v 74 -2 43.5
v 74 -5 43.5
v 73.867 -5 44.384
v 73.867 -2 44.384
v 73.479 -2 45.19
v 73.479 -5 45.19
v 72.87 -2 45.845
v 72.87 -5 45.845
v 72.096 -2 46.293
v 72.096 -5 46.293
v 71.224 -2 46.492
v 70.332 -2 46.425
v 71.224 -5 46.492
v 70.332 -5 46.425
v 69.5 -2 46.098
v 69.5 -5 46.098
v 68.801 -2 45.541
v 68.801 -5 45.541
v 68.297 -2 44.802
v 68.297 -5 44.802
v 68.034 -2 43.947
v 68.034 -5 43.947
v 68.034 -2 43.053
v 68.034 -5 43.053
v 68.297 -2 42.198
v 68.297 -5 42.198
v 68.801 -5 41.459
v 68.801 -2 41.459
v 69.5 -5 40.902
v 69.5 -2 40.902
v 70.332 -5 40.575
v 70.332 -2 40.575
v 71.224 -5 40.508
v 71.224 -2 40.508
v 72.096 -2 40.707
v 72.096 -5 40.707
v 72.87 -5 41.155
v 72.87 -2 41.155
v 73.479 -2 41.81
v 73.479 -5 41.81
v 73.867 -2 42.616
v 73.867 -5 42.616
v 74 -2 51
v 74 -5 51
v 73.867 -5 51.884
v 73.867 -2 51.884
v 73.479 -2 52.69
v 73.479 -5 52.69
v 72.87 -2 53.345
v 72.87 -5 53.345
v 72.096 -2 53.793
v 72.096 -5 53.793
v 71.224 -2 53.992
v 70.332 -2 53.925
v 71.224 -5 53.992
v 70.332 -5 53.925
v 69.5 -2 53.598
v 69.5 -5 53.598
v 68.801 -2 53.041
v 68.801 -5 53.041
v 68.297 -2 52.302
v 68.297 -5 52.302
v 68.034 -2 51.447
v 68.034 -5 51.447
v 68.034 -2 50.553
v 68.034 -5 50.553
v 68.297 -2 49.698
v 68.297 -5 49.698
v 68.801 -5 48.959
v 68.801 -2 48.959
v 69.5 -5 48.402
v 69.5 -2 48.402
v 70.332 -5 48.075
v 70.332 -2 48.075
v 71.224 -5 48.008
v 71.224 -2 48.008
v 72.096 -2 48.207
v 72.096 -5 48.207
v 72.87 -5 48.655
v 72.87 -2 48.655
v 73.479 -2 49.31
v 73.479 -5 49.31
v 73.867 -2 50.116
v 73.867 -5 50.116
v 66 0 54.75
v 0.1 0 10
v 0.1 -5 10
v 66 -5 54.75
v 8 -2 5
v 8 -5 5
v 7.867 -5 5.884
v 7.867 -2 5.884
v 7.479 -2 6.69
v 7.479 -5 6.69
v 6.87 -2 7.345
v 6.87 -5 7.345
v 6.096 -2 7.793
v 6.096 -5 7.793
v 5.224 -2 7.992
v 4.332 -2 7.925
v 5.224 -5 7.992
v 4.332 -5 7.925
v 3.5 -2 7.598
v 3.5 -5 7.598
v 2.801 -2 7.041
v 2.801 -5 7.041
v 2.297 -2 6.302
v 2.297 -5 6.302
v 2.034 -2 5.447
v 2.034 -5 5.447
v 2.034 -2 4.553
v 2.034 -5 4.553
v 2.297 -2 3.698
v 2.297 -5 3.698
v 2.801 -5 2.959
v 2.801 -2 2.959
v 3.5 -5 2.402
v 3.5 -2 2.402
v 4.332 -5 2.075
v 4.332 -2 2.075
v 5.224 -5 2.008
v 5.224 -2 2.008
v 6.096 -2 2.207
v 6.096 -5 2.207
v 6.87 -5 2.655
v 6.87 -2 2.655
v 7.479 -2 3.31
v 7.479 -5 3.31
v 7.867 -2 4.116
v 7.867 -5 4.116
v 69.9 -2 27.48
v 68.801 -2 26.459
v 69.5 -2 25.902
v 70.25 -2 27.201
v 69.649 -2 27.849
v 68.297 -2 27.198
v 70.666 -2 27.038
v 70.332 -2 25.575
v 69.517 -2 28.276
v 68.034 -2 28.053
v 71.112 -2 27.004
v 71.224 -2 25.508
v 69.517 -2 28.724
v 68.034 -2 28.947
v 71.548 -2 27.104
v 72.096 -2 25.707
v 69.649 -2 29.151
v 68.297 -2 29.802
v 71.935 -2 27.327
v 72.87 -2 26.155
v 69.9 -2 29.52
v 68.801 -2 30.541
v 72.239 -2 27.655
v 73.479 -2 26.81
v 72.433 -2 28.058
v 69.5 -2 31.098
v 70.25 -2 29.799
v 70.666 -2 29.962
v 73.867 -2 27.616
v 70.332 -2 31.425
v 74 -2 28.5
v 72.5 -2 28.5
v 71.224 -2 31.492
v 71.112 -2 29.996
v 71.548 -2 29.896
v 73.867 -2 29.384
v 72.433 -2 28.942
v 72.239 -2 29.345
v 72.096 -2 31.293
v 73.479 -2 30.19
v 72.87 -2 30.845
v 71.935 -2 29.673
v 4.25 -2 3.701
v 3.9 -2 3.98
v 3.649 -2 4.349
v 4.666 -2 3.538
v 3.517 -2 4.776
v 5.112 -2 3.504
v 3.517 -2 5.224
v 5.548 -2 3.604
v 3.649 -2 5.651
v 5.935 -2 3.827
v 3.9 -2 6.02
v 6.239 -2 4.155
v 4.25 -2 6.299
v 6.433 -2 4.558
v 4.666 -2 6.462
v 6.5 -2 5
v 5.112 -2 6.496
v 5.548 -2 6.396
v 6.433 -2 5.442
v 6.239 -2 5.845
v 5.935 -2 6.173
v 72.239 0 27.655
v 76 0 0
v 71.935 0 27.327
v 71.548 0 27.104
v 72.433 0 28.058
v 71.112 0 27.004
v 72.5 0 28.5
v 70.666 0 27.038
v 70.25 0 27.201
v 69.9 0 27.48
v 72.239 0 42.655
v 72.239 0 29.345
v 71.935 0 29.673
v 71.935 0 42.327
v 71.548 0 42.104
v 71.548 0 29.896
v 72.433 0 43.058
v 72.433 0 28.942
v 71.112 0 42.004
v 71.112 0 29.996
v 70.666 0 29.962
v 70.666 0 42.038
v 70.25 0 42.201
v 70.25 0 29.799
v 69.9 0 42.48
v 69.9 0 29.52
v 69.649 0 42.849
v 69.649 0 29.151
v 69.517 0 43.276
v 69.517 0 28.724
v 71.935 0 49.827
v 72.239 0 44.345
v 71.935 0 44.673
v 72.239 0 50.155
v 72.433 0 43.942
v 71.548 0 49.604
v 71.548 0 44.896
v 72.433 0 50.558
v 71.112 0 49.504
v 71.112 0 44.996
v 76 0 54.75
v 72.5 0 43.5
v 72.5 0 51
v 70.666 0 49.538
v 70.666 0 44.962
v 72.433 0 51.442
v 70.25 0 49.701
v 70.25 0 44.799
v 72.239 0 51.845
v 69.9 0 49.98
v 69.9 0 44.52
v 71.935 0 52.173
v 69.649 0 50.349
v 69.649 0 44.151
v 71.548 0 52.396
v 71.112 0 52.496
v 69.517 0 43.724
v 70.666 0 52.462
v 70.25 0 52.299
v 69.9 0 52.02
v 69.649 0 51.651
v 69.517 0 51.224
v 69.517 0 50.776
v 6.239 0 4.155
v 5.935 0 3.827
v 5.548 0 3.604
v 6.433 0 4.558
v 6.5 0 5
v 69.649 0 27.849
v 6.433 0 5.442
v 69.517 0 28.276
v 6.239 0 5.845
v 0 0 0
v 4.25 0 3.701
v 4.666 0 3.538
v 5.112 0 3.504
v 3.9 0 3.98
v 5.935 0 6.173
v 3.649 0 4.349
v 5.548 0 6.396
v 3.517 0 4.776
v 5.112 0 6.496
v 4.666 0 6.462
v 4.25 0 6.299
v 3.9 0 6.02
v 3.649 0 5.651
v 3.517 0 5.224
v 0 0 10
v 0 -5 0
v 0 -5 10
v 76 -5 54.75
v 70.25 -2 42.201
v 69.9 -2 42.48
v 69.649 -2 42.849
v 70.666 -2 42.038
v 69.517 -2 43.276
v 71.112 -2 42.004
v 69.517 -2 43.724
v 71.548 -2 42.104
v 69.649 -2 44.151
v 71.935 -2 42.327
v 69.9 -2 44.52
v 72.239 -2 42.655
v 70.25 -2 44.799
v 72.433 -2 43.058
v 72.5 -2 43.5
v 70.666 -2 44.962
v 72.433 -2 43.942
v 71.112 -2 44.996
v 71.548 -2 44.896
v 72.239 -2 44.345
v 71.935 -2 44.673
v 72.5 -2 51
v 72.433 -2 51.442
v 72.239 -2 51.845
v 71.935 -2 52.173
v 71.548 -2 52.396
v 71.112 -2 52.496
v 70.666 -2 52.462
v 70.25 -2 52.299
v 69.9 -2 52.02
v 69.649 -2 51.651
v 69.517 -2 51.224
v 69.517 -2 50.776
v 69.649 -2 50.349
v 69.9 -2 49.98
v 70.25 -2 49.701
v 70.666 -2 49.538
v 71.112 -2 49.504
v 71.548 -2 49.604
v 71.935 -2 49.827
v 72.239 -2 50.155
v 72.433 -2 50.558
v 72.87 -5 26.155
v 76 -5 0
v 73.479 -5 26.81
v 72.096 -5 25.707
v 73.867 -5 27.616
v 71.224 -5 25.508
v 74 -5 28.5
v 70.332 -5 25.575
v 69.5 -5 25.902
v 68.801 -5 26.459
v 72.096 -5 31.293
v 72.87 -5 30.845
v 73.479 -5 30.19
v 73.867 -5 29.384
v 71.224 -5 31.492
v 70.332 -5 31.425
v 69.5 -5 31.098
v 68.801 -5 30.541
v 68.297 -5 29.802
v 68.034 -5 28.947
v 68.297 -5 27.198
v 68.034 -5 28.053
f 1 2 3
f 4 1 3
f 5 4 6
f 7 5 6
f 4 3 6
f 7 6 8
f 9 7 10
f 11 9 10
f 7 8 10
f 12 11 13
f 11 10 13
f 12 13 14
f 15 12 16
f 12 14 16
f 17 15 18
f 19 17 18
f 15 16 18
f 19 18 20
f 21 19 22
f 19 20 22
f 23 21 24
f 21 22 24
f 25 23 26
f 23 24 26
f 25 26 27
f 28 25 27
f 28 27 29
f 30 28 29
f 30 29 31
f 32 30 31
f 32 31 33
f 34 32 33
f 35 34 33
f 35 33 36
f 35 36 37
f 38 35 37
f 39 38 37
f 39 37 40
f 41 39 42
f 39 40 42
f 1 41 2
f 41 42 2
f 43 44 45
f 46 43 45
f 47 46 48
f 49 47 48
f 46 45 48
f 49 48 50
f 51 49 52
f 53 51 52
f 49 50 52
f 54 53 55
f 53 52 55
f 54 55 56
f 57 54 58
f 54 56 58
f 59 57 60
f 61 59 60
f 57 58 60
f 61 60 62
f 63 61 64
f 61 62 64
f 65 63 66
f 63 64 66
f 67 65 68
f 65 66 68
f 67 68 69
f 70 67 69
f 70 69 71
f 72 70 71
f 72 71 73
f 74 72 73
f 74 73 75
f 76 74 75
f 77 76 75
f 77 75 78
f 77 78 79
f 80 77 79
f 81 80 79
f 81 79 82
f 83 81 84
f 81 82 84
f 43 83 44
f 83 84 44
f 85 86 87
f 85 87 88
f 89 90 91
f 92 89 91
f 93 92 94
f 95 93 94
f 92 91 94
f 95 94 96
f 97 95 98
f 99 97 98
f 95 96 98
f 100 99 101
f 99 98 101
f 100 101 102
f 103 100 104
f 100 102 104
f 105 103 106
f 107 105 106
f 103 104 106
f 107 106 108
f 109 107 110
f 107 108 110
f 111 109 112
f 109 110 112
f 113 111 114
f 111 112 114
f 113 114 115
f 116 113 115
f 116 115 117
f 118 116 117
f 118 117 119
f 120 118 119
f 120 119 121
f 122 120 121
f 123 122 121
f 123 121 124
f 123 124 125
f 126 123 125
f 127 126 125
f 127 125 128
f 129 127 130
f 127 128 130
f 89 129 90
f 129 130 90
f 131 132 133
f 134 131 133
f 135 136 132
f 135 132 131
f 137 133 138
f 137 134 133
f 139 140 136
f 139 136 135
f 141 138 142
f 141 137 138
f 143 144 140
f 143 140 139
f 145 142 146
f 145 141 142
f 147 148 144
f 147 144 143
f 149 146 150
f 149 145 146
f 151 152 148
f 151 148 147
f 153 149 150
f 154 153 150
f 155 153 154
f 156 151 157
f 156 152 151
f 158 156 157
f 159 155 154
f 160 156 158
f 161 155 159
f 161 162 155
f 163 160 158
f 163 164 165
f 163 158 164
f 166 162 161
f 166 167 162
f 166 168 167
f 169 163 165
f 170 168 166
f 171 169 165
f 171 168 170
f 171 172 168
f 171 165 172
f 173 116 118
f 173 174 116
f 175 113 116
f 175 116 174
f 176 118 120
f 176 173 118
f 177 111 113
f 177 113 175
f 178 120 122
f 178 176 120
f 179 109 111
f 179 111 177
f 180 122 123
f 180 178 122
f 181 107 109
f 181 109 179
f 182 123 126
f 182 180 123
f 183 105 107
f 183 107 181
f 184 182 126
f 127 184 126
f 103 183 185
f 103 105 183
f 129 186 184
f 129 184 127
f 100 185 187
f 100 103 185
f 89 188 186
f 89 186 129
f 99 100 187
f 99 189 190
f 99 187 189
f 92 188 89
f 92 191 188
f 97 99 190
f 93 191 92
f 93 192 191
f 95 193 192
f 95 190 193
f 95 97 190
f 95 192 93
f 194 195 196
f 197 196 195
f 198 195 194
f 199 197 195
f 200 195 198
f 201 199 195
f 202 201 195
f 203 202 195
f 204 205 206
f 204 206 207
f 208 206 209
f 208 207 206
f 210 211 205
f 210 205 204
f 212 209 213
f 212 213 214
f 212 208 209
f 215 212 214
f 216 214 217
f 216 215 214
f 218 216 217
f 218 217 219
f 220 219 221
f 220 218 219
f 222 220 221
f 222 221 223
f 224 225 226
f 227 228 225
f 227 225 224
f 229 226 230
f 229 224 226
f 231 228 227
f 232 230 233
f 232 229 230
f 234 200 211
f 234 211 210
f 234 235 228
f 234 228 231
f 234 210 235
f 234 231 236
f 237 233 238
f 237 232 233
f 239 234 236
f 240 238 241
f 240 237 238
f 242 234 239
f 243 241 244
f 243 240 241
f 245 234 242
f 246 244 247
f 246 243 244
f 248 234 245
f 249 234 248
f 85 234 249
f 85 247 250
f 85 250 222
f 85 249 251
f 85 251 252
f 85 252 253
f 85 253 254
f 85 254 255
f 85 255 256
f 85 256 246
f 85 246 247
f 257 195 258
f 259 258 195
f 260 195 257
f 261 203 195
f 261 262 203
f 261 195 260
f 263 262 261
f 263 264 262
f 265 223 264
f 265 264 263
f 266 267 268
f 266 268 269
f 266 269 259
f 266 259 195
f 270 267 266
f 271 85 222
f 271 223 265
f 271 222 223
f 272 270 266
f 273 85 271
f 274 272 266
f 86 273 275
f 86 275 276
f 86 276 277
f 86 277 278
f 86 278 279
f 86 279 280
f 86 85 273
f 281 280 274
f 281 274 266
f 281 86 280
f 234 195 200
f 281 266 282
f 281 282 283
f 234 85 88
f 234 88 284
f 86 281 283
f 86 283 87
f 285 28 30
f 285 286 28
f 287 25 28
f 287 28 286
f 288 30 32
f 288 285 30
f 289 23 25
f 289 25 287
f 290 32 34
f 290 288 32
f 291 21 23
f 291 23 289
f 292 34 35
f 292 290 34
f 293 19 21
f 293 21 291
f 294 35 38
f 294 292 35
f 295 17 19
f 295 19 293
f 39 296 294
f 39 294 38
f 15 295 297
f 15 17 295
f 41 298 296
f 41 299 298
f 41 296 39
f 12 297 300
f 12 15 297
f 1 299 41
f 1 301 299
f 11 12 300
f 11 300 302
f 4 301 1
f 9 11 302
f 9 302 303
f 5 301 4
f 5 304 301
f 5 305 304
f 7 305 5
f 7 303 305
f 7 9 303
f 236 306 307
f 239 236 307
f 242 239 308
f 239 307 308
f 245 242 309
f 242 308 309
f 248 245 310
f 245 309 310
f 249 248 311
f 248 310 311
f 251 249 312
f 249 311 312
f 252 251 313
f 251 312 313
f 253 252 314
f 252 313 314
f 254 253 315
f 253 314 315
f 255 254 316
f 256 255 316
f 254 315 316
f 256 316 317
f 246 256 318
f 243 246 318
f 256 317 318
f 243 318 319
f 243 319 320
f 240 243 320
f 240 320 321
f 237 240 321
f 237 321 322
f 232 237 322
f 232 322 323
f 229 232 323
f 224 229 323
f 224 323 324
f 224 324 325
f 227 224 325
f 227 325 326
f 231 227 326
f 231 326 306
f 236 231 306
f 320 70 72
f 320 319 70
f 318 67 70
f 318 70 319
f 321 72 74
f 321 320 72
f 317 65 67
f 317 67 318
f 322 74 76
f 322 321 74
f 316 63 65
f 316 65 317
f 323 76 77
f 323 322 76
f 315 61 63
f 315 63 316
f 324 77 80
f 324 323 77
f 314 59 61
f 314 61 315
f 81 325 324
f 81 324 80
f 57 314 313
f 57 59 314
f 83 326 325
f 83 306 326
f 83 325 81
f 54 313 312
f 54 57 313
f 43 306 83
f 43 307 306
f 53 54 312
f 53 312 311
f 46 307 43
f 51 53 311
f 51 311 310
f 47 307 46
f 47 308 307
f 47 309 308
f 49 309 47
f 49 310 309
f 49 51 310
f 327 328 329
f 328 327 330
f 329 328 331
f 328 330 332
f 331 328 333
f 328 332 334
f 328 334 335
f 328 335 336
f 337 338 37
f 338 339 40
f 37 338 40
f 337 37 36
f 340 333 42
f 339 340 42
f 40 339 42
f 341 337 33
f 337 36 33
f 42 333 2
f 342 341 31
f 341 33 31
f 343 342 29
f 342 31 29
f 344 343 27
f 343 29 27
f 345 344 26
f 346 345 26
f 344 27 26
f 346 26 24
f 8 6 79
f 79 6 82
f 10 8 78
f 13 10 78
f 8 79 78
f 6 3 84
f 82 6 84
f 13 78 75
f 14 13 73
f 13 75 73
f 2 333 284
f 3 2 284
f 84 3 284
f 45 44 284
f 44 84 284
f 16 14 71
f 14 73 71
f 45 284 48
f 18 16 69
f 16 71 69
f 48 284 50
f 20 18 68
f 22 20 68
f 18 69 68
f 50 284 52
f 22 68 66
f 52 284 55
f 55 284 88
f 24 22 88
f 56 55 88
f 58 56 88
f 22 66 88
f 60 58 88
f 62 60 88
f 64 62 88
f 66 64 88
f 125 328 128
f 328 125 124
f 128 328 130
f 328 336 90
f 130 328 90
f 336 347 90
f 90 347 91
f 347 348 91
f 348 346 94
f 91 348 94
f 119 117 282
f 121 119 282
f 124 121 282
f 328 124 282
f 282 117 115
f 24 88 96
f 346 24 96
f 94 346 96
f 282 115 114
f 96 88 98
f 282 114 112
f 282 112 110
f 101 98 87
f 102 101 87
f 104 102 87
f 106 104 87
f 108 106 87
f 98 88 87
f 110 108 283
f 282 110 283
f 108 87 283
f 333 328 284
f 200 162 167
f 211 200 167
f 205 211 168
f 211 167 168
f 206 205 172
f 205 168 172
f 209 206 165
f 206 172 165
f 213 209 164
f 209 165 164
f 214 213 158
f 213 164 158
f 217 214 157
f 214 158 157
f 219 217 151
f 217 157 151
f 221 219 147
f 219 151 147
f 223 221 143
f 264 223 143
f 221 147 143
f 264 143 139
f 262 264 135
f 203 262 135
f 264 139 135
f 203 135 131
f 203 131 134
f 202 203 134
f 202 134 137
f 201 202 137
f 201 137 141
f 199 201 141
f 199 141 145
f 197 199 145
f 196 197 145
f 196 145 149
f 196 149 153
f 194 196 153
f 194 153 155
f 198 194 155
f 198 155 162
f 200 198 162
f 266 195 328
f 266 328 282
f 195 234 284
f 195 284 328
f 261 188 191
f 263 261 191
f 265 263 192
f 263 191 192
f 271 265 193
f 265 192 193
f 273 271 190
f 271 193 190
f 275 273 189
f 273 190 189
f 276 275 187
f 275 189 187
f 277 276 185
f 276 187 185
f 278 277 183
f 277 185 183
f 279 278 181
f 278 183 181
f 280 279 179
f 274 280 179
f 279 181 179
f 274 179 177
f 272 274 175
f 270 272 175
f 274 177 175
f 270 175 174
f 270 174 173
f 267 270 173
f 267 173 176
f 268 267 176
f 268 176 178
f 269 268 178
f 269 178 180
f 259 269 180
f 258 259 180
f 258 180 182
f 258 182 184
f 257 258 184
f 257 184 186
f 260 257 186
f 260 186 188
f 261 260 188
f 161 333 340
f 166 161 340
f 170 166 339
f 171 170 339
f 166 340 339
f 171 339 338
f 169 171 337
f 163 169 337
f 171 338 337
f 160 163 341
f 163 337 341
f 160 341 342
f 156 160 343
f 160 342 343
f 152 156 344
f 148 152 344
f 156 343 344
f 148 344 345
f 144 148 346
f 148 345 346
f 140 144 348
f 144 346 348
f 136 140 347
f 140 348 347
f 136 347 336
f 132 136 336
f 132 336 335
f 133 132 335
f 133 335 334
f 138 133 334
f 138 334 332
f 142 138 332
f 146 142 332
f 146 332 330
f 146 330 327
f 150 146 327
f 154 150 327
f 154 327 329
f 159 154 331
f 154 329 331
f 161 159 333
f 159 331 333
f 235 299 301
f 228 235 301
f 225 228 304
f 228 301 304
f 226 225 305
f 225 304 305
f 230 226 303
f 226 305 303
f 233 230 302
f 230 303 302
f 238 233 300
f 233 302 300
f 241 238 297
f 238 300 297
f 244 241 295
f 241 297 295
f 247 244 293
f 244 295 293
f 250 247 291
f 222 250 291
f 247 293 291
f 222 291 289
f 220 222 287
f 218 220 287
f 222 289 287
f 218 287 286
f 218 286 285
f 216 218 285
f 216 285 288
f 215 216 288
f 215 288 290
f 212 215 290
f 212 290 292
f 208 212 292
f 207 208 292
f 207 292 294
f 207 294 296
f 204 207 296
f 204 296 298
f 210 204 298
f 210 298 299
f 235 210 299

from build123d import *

# Parameters (mm, degrees)
PAD_DEPTH       = 5
SKETCH001_R     = 1.5
POCKET_DEPTH    = 5.001
SKETCH002_R     = 3
POCKET001_DEPTH = 3


with BuildPart() as part:
    # Sketch → Pad (new body)
    with BuildSketch(Plane.XZ):
        Polygon((0, 0), (0, 10), (0.1, 10), (66, 54.75), (76, 54.75), (76, 0), align=None)
    extrude(amount=PAD_DEPTH)

    # Sketch001 (on Face8 of Pad) → Pocket (cut, through all)
    with BuildSketch(Plane.XZ.offset(5)):
        with Locations((5, 5)):
            Circle(SKETCH001_R)
        with Locations((71, 51)):
            Circle(SKETCH001_R)
        with Locations((71, 43.5)):
            Circle(SKETCH001_R)
        with Locations((71, 28.5)):
            Circle(SKETCH001_R)
    extrude(amount=-POCKET_DEPTH, mode=Mode.SUBTRACT)

    # Sketch002 (on Face5 of Pocket) → Pocket001 (cut)
    with BuildSketch(Plane.XZ.offset(5)):
        with Locations((71, 28.5)):
            Circle(SKETCH002_R)
        with Locations((71, 43.5)):
            Circle(SKETCH002_R)
        with Locations((71, 51)):
            Circle(SKETCH002_R)
        with Locations((5, 5)):
            Circle(SKETCH002_R)
    extrude(amount=-POCKET001_DEPTH, mode=Mode.SUBTRACT)


solid = part.part
